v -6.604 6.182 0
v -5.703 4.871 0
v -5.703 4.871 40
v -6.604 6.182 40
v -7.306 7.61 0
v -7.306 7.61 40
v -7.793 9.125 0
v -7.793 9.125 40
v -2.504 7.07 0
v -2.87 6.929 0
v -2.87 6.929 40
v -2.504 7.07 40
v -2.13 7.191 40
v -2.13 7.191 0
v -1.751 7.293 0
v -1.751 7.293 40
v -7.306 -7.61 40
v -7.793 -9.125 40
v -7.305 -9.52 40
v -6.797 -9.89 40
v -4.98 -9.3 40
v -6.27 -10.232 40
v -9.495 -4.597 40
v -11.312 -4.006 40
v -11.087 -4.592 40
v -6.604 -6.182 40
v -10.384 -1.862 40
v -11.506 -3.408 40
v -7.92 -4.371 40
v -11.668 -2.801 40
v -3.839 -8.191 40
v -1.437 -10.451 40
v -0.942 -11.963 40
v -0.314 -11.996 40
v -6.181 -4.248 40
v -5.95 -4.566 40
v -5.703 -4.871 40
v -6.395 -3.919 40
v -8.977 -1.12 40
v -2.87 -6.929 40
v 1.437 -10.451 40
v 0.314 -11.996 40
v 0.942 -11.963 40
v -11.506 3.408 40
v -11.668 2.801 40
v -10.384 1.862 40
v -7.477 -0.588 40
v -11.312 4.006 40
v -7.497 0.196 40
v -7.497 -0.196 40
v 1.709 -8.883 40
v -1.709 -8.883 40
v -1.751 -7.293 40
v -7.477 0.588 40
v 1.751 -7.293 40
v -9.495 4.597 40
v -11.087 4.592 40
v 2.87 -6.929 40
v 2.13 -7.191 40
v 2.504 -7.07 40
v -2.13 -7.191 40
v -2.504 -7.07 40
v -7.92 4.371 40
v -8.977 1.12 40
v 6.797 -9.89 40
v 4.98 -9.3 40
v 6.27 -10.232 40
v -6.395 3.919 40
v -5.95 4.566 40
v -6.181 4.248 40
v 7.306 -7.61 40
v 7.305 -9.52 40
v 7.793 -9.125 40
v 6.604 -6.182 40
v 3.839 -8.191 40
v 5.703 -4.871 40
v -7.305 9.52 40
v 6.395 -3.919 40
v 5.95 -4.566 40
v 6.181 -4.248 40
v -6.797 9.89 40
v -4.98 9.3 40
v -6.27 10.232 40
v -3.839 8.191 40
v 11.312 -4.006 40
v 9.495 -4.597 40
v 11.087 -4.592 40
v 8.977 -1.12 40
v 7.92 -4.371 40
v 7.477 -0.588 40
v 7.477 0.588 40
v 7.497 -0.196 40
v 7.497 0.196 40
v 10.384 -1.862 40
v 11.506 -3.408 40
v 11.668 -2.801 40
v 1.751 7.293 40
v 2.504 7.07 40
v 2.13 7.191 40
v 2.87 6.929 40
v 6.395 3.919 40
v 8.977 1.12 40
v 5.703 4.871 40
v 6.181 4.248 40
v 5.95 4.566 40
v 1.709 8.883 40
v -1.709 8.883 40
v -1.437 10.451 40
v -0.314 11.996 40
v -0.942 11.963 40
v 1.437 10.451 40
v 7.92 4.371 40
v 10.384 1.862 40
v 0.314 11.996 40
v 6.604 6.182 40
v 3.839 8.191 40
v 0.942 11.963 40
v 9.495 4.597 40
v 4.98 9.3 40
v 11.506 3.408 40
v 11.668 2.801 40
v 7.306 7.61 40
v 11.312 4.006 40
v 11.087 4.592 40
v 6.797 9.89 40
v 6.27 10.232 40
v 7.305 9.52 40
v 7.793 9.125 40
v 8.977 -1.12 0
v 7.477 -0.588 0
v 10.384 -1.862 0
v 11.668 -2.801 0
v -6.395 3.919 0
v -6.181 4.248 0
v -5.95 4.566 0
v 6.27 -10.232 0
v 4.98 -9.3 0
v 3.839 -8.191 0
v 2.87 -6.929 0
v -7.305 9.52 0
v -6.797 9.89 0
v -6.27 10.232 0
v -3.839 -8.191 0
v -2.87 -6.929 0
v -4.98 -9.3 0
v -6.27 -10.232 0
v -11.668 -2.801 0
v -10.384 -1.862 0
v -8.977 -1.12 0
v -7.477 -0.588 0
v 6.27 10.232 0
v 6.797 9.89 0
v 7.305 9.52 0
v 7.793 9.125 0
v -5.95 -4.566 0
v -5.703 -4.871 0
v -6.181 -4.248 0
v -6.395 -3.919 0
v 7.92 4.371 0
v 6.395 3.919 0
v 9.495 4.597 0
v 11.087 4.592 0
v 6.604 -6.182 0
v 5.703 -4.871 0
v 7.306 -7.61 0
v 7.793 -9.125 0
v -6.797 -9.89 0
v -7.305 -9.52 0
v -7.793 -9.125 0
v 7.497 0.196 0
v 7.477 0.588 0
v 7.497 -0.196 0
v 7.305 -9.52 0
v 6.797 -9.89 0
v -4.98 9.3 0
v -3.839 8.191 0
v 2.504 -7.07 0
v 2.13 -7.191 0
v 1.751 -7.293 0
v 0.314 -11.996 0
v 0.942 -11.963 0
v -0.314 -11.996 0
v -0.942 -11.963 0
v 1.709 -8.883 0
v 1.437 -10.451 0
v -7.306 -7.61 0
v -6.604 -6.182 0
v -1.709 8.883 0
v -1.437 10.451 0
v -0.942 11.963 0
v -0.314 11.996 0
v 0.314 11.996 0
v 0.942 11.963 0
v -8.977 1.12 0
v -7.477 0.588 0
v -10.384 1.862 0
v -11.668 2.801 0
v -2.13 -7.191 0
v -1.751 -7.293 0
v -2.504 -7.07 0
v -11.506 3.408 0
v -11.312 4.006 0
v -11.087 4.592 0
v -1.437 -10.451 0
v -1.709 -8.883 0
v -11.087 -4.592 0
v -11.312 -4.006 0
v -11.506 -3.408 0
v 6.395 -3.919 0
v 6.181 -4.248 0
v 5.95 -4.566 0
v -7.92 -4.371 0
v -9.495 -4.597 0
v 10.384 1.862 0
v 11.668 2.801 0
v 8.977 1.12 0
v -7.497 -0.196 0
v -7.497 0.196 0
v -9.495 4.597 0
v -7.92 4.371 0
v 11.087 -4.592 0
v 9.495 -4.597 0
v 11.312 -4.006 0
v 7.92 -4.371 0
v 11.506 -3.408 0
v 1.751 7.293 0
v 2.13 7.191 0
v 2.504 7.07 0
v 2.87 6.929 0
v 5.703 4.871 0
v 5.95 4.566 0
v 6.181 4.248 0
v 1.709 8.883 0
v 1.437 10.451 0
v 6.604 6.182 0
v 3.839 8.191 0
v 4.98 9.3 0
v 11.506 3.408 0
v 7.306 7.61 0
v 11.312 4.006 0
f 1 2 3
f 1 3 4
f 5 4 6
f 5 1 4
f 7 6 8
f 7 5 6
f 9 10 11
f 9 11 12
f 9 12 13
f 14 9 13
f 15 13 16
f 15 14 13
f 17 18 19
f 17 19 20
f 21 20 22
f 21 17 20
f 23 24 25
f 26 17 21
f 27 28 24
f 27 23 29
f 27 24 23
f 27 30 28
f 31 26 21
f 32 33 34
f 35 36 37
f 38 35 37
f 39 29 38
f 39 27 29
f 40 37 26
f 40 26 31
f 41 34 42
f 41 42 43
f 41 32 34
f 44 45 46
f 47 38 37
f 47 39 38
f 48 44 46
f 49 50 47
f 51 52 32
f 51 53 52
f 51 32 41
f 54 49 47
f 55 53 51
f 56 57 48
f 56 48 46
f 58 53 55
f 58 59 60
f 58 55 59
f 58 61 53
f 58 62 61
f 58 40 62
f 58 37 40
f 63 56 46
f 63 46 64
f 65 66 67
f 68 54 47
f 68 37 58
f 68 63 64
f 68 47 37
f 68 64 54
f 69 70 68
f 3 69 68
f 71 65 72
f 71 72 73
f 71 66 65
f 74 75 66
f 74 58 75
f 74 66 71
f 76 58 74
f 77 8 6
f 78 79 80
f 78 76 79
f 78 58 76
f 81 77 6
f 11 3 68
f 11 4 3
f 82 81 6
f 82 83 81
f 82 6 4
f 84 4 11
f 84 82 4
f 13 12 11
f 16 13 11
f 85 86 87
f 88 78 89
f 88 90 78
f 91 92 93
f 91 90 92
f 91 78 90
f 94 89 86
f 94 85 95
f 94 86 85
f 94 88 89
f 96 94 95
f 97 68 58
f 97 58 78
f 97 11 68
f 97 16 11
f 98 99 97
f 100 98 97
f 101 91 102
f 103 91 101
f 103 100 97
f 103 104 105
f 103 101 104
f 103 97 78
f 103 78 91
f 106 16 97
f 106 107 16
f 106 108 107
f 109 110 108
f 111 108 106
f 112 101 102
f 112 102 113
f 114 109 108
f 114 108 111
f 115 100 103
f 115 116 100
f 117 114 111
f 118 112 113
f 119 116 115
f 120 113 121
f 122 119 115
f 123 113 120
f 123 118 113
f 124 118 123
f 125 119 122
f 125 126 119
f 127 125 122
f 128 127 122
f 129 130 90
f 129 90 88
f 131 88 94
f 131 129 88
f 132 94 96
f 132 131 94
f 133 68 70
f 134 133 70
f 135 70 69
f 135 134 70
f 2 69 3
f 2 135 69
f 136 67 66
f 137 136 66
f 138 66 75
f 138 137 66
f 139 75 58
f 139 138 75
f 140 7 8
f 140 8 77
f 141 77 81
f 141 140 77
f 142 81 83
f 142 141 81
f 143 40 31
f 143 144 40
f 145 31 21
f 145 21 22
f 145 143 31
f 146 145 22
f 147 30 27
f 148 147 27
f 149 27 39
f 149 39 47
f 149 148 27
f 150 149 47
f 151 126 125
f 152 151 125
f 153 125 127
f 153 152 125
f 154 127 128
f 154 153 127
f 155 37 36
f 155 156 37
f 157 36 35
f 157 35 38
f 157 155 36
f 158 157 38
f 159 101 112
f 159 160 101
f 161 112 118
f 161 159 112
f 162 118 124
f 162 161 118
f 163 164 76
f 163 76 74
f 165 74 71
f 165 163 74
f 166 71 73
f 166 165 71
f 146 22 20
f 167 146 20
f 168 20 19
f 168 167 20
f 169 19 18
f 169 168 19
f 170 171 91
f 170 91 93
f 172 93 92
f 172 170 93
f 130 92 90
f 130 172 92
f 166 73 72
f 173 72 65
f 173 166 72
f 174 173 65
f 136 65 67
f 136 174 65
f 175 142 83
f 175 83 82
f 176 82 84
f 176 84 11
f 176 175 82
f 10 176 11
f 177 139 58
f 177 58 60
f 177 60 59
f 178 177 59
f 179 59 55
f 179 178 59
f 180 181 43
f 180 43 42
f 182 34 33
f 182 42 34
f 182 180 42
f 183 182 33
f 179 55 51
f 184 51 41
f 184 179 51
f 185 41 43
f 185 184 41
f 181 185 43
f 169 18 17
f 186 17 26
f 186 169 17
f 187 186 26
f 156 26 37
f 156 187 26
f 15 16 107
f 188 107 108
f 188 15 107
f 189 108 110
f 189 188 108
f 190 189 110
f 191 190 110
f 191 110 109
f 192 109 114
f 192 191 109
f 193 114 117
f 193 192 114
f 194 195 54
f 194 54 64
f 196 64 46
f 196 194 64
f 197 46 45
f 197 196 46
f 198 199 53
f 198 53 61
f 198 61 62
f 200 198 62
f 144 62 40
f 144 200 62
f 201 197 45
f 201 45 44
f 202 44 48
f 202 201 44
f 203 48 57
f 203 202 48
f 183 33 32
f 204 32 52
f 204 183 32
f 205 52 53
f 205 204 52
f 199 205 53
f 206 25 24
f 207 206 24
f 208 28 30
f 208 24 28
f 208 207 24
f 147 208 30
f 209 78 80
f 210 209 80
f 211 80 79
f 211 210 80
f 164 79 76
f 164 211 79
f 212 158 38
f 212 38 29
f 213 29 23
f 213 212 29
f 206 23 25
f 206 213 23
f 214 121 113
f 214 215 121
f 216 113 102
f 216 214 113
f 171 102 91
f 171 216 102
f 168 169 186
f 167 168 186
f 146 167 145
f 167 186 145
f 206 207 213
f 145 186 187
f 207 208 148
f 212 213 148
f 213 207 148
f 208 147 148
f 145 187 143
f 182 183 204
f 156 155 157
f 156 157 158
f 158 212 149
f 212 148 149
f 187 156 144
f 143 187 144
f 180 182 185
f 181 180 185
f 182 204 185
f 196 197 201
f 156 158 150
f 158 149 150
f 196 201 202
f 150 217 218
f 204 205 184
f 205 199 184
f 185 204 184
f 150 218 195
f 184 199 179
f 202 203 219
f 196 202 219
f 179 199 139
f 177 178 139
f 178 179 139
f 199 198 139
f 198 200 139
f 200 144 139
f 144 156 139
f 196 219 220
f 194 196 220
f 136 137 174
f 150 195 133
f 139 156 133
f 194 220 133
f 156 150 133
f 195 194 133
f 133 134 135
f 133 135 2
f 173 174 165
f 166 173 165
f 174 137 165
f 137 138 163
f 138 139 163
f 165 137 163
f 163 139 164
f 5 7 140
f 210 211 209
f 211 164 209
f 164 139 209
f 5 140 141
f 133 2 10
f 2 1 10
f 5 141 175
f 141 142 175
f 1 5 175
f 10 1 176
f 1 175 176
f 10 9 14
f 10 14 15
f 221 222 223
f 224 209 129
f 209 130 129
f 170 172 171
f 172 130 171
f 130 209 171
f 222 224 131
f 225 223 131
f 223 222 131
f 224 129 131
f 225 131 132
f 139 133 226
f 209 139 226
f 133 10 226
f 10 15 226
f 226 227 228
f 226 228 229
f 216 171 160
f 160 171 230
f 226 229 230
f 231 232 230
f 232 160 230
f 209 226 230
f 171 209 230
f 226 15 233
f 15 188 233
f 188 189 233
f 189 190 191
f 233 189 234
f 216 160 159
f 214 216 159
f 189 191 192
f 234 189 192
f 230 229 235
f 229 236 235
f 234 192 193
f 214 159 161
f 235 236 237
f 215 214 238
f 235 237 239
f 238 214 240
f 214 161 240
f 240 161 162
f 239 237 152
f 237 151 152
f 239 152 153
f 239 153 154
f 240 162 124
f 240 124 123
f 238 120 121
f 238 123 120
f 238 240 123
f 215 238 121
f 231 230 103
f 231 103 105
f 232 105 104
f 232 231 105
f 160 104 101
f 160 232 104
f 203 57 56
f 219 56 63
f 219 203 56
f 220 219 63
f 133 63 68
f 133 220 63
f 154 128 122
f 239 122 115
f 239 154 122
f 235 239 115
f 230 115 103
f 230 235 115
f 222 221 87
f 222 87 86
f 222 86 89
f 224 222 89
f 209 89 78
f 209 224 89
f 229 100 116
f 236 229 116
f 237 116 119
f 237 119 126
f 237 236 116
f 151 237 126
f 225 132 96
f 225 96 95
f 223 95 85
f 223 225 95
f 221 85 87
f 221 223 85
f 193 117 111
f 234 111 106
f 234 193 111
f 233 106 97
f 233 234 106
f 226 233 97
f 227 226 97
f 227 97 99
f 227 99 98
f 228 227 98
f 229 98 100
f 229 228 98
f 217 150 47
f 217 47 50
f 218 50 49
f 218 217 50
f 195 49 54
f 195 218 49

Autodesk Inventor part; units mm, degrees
sketch "Sketch1" plane through (0, 0, 0) normal (0, 0, 1) x (1, 0, 0)
  circle A0 centre (0, 0) radius 12
  dimension "d0" = 24
extrude "Extrusion1" add sketch "Sketch1" along normal blind 40
ref_plane "Work Plane2" through (0, 0, 20) normal (0, 0, 1) x (1, 0, 0)
sketch "Sketch2" plane through (0, 0, 0) normal (0, 0, -1) x (-1, 0, 0)
  circle A0 centre (0, 0) radius 12 projected
  circle A1 centre (0, 0) radius 10
  dimension "d3" = 20
surface extrude "Pitch Diameter" sketch "Sketch2" against normal through all shown no curves A1
ref_plane "Work Plane8" through (0, 0, 0) normal (0.9510565, 0.309017, 0) x (0, 0, 1)
ref_plane "Work Plane9" through (0, 0, 0) normal (1, 0, 0) x (0, 1, 0)
spur gear teeth "Spur Gear" teeth 10 pitch diameter 20 tip diameter 24 root diameter 15 face width 40 start plane through (0, 0, 0) normal (0, 0, -1) x (-1, 0, 0)
equation "\"d0\" = da_da"
equation "\"d1\" = da_b"
equation "\"d3\" = da_d"
equation "\"d16\" = da_aw"
equation "\"d43\" = da_aw"
equation "\"d46\" = da_aw"
equation "\"da_da\" = 24"
equation "\"da_b\" = 40"
equation "\"da_d\" = 20"
equation "\"da_aw\" = 35"
properties part number "Spur Gear1" material "Steel"
